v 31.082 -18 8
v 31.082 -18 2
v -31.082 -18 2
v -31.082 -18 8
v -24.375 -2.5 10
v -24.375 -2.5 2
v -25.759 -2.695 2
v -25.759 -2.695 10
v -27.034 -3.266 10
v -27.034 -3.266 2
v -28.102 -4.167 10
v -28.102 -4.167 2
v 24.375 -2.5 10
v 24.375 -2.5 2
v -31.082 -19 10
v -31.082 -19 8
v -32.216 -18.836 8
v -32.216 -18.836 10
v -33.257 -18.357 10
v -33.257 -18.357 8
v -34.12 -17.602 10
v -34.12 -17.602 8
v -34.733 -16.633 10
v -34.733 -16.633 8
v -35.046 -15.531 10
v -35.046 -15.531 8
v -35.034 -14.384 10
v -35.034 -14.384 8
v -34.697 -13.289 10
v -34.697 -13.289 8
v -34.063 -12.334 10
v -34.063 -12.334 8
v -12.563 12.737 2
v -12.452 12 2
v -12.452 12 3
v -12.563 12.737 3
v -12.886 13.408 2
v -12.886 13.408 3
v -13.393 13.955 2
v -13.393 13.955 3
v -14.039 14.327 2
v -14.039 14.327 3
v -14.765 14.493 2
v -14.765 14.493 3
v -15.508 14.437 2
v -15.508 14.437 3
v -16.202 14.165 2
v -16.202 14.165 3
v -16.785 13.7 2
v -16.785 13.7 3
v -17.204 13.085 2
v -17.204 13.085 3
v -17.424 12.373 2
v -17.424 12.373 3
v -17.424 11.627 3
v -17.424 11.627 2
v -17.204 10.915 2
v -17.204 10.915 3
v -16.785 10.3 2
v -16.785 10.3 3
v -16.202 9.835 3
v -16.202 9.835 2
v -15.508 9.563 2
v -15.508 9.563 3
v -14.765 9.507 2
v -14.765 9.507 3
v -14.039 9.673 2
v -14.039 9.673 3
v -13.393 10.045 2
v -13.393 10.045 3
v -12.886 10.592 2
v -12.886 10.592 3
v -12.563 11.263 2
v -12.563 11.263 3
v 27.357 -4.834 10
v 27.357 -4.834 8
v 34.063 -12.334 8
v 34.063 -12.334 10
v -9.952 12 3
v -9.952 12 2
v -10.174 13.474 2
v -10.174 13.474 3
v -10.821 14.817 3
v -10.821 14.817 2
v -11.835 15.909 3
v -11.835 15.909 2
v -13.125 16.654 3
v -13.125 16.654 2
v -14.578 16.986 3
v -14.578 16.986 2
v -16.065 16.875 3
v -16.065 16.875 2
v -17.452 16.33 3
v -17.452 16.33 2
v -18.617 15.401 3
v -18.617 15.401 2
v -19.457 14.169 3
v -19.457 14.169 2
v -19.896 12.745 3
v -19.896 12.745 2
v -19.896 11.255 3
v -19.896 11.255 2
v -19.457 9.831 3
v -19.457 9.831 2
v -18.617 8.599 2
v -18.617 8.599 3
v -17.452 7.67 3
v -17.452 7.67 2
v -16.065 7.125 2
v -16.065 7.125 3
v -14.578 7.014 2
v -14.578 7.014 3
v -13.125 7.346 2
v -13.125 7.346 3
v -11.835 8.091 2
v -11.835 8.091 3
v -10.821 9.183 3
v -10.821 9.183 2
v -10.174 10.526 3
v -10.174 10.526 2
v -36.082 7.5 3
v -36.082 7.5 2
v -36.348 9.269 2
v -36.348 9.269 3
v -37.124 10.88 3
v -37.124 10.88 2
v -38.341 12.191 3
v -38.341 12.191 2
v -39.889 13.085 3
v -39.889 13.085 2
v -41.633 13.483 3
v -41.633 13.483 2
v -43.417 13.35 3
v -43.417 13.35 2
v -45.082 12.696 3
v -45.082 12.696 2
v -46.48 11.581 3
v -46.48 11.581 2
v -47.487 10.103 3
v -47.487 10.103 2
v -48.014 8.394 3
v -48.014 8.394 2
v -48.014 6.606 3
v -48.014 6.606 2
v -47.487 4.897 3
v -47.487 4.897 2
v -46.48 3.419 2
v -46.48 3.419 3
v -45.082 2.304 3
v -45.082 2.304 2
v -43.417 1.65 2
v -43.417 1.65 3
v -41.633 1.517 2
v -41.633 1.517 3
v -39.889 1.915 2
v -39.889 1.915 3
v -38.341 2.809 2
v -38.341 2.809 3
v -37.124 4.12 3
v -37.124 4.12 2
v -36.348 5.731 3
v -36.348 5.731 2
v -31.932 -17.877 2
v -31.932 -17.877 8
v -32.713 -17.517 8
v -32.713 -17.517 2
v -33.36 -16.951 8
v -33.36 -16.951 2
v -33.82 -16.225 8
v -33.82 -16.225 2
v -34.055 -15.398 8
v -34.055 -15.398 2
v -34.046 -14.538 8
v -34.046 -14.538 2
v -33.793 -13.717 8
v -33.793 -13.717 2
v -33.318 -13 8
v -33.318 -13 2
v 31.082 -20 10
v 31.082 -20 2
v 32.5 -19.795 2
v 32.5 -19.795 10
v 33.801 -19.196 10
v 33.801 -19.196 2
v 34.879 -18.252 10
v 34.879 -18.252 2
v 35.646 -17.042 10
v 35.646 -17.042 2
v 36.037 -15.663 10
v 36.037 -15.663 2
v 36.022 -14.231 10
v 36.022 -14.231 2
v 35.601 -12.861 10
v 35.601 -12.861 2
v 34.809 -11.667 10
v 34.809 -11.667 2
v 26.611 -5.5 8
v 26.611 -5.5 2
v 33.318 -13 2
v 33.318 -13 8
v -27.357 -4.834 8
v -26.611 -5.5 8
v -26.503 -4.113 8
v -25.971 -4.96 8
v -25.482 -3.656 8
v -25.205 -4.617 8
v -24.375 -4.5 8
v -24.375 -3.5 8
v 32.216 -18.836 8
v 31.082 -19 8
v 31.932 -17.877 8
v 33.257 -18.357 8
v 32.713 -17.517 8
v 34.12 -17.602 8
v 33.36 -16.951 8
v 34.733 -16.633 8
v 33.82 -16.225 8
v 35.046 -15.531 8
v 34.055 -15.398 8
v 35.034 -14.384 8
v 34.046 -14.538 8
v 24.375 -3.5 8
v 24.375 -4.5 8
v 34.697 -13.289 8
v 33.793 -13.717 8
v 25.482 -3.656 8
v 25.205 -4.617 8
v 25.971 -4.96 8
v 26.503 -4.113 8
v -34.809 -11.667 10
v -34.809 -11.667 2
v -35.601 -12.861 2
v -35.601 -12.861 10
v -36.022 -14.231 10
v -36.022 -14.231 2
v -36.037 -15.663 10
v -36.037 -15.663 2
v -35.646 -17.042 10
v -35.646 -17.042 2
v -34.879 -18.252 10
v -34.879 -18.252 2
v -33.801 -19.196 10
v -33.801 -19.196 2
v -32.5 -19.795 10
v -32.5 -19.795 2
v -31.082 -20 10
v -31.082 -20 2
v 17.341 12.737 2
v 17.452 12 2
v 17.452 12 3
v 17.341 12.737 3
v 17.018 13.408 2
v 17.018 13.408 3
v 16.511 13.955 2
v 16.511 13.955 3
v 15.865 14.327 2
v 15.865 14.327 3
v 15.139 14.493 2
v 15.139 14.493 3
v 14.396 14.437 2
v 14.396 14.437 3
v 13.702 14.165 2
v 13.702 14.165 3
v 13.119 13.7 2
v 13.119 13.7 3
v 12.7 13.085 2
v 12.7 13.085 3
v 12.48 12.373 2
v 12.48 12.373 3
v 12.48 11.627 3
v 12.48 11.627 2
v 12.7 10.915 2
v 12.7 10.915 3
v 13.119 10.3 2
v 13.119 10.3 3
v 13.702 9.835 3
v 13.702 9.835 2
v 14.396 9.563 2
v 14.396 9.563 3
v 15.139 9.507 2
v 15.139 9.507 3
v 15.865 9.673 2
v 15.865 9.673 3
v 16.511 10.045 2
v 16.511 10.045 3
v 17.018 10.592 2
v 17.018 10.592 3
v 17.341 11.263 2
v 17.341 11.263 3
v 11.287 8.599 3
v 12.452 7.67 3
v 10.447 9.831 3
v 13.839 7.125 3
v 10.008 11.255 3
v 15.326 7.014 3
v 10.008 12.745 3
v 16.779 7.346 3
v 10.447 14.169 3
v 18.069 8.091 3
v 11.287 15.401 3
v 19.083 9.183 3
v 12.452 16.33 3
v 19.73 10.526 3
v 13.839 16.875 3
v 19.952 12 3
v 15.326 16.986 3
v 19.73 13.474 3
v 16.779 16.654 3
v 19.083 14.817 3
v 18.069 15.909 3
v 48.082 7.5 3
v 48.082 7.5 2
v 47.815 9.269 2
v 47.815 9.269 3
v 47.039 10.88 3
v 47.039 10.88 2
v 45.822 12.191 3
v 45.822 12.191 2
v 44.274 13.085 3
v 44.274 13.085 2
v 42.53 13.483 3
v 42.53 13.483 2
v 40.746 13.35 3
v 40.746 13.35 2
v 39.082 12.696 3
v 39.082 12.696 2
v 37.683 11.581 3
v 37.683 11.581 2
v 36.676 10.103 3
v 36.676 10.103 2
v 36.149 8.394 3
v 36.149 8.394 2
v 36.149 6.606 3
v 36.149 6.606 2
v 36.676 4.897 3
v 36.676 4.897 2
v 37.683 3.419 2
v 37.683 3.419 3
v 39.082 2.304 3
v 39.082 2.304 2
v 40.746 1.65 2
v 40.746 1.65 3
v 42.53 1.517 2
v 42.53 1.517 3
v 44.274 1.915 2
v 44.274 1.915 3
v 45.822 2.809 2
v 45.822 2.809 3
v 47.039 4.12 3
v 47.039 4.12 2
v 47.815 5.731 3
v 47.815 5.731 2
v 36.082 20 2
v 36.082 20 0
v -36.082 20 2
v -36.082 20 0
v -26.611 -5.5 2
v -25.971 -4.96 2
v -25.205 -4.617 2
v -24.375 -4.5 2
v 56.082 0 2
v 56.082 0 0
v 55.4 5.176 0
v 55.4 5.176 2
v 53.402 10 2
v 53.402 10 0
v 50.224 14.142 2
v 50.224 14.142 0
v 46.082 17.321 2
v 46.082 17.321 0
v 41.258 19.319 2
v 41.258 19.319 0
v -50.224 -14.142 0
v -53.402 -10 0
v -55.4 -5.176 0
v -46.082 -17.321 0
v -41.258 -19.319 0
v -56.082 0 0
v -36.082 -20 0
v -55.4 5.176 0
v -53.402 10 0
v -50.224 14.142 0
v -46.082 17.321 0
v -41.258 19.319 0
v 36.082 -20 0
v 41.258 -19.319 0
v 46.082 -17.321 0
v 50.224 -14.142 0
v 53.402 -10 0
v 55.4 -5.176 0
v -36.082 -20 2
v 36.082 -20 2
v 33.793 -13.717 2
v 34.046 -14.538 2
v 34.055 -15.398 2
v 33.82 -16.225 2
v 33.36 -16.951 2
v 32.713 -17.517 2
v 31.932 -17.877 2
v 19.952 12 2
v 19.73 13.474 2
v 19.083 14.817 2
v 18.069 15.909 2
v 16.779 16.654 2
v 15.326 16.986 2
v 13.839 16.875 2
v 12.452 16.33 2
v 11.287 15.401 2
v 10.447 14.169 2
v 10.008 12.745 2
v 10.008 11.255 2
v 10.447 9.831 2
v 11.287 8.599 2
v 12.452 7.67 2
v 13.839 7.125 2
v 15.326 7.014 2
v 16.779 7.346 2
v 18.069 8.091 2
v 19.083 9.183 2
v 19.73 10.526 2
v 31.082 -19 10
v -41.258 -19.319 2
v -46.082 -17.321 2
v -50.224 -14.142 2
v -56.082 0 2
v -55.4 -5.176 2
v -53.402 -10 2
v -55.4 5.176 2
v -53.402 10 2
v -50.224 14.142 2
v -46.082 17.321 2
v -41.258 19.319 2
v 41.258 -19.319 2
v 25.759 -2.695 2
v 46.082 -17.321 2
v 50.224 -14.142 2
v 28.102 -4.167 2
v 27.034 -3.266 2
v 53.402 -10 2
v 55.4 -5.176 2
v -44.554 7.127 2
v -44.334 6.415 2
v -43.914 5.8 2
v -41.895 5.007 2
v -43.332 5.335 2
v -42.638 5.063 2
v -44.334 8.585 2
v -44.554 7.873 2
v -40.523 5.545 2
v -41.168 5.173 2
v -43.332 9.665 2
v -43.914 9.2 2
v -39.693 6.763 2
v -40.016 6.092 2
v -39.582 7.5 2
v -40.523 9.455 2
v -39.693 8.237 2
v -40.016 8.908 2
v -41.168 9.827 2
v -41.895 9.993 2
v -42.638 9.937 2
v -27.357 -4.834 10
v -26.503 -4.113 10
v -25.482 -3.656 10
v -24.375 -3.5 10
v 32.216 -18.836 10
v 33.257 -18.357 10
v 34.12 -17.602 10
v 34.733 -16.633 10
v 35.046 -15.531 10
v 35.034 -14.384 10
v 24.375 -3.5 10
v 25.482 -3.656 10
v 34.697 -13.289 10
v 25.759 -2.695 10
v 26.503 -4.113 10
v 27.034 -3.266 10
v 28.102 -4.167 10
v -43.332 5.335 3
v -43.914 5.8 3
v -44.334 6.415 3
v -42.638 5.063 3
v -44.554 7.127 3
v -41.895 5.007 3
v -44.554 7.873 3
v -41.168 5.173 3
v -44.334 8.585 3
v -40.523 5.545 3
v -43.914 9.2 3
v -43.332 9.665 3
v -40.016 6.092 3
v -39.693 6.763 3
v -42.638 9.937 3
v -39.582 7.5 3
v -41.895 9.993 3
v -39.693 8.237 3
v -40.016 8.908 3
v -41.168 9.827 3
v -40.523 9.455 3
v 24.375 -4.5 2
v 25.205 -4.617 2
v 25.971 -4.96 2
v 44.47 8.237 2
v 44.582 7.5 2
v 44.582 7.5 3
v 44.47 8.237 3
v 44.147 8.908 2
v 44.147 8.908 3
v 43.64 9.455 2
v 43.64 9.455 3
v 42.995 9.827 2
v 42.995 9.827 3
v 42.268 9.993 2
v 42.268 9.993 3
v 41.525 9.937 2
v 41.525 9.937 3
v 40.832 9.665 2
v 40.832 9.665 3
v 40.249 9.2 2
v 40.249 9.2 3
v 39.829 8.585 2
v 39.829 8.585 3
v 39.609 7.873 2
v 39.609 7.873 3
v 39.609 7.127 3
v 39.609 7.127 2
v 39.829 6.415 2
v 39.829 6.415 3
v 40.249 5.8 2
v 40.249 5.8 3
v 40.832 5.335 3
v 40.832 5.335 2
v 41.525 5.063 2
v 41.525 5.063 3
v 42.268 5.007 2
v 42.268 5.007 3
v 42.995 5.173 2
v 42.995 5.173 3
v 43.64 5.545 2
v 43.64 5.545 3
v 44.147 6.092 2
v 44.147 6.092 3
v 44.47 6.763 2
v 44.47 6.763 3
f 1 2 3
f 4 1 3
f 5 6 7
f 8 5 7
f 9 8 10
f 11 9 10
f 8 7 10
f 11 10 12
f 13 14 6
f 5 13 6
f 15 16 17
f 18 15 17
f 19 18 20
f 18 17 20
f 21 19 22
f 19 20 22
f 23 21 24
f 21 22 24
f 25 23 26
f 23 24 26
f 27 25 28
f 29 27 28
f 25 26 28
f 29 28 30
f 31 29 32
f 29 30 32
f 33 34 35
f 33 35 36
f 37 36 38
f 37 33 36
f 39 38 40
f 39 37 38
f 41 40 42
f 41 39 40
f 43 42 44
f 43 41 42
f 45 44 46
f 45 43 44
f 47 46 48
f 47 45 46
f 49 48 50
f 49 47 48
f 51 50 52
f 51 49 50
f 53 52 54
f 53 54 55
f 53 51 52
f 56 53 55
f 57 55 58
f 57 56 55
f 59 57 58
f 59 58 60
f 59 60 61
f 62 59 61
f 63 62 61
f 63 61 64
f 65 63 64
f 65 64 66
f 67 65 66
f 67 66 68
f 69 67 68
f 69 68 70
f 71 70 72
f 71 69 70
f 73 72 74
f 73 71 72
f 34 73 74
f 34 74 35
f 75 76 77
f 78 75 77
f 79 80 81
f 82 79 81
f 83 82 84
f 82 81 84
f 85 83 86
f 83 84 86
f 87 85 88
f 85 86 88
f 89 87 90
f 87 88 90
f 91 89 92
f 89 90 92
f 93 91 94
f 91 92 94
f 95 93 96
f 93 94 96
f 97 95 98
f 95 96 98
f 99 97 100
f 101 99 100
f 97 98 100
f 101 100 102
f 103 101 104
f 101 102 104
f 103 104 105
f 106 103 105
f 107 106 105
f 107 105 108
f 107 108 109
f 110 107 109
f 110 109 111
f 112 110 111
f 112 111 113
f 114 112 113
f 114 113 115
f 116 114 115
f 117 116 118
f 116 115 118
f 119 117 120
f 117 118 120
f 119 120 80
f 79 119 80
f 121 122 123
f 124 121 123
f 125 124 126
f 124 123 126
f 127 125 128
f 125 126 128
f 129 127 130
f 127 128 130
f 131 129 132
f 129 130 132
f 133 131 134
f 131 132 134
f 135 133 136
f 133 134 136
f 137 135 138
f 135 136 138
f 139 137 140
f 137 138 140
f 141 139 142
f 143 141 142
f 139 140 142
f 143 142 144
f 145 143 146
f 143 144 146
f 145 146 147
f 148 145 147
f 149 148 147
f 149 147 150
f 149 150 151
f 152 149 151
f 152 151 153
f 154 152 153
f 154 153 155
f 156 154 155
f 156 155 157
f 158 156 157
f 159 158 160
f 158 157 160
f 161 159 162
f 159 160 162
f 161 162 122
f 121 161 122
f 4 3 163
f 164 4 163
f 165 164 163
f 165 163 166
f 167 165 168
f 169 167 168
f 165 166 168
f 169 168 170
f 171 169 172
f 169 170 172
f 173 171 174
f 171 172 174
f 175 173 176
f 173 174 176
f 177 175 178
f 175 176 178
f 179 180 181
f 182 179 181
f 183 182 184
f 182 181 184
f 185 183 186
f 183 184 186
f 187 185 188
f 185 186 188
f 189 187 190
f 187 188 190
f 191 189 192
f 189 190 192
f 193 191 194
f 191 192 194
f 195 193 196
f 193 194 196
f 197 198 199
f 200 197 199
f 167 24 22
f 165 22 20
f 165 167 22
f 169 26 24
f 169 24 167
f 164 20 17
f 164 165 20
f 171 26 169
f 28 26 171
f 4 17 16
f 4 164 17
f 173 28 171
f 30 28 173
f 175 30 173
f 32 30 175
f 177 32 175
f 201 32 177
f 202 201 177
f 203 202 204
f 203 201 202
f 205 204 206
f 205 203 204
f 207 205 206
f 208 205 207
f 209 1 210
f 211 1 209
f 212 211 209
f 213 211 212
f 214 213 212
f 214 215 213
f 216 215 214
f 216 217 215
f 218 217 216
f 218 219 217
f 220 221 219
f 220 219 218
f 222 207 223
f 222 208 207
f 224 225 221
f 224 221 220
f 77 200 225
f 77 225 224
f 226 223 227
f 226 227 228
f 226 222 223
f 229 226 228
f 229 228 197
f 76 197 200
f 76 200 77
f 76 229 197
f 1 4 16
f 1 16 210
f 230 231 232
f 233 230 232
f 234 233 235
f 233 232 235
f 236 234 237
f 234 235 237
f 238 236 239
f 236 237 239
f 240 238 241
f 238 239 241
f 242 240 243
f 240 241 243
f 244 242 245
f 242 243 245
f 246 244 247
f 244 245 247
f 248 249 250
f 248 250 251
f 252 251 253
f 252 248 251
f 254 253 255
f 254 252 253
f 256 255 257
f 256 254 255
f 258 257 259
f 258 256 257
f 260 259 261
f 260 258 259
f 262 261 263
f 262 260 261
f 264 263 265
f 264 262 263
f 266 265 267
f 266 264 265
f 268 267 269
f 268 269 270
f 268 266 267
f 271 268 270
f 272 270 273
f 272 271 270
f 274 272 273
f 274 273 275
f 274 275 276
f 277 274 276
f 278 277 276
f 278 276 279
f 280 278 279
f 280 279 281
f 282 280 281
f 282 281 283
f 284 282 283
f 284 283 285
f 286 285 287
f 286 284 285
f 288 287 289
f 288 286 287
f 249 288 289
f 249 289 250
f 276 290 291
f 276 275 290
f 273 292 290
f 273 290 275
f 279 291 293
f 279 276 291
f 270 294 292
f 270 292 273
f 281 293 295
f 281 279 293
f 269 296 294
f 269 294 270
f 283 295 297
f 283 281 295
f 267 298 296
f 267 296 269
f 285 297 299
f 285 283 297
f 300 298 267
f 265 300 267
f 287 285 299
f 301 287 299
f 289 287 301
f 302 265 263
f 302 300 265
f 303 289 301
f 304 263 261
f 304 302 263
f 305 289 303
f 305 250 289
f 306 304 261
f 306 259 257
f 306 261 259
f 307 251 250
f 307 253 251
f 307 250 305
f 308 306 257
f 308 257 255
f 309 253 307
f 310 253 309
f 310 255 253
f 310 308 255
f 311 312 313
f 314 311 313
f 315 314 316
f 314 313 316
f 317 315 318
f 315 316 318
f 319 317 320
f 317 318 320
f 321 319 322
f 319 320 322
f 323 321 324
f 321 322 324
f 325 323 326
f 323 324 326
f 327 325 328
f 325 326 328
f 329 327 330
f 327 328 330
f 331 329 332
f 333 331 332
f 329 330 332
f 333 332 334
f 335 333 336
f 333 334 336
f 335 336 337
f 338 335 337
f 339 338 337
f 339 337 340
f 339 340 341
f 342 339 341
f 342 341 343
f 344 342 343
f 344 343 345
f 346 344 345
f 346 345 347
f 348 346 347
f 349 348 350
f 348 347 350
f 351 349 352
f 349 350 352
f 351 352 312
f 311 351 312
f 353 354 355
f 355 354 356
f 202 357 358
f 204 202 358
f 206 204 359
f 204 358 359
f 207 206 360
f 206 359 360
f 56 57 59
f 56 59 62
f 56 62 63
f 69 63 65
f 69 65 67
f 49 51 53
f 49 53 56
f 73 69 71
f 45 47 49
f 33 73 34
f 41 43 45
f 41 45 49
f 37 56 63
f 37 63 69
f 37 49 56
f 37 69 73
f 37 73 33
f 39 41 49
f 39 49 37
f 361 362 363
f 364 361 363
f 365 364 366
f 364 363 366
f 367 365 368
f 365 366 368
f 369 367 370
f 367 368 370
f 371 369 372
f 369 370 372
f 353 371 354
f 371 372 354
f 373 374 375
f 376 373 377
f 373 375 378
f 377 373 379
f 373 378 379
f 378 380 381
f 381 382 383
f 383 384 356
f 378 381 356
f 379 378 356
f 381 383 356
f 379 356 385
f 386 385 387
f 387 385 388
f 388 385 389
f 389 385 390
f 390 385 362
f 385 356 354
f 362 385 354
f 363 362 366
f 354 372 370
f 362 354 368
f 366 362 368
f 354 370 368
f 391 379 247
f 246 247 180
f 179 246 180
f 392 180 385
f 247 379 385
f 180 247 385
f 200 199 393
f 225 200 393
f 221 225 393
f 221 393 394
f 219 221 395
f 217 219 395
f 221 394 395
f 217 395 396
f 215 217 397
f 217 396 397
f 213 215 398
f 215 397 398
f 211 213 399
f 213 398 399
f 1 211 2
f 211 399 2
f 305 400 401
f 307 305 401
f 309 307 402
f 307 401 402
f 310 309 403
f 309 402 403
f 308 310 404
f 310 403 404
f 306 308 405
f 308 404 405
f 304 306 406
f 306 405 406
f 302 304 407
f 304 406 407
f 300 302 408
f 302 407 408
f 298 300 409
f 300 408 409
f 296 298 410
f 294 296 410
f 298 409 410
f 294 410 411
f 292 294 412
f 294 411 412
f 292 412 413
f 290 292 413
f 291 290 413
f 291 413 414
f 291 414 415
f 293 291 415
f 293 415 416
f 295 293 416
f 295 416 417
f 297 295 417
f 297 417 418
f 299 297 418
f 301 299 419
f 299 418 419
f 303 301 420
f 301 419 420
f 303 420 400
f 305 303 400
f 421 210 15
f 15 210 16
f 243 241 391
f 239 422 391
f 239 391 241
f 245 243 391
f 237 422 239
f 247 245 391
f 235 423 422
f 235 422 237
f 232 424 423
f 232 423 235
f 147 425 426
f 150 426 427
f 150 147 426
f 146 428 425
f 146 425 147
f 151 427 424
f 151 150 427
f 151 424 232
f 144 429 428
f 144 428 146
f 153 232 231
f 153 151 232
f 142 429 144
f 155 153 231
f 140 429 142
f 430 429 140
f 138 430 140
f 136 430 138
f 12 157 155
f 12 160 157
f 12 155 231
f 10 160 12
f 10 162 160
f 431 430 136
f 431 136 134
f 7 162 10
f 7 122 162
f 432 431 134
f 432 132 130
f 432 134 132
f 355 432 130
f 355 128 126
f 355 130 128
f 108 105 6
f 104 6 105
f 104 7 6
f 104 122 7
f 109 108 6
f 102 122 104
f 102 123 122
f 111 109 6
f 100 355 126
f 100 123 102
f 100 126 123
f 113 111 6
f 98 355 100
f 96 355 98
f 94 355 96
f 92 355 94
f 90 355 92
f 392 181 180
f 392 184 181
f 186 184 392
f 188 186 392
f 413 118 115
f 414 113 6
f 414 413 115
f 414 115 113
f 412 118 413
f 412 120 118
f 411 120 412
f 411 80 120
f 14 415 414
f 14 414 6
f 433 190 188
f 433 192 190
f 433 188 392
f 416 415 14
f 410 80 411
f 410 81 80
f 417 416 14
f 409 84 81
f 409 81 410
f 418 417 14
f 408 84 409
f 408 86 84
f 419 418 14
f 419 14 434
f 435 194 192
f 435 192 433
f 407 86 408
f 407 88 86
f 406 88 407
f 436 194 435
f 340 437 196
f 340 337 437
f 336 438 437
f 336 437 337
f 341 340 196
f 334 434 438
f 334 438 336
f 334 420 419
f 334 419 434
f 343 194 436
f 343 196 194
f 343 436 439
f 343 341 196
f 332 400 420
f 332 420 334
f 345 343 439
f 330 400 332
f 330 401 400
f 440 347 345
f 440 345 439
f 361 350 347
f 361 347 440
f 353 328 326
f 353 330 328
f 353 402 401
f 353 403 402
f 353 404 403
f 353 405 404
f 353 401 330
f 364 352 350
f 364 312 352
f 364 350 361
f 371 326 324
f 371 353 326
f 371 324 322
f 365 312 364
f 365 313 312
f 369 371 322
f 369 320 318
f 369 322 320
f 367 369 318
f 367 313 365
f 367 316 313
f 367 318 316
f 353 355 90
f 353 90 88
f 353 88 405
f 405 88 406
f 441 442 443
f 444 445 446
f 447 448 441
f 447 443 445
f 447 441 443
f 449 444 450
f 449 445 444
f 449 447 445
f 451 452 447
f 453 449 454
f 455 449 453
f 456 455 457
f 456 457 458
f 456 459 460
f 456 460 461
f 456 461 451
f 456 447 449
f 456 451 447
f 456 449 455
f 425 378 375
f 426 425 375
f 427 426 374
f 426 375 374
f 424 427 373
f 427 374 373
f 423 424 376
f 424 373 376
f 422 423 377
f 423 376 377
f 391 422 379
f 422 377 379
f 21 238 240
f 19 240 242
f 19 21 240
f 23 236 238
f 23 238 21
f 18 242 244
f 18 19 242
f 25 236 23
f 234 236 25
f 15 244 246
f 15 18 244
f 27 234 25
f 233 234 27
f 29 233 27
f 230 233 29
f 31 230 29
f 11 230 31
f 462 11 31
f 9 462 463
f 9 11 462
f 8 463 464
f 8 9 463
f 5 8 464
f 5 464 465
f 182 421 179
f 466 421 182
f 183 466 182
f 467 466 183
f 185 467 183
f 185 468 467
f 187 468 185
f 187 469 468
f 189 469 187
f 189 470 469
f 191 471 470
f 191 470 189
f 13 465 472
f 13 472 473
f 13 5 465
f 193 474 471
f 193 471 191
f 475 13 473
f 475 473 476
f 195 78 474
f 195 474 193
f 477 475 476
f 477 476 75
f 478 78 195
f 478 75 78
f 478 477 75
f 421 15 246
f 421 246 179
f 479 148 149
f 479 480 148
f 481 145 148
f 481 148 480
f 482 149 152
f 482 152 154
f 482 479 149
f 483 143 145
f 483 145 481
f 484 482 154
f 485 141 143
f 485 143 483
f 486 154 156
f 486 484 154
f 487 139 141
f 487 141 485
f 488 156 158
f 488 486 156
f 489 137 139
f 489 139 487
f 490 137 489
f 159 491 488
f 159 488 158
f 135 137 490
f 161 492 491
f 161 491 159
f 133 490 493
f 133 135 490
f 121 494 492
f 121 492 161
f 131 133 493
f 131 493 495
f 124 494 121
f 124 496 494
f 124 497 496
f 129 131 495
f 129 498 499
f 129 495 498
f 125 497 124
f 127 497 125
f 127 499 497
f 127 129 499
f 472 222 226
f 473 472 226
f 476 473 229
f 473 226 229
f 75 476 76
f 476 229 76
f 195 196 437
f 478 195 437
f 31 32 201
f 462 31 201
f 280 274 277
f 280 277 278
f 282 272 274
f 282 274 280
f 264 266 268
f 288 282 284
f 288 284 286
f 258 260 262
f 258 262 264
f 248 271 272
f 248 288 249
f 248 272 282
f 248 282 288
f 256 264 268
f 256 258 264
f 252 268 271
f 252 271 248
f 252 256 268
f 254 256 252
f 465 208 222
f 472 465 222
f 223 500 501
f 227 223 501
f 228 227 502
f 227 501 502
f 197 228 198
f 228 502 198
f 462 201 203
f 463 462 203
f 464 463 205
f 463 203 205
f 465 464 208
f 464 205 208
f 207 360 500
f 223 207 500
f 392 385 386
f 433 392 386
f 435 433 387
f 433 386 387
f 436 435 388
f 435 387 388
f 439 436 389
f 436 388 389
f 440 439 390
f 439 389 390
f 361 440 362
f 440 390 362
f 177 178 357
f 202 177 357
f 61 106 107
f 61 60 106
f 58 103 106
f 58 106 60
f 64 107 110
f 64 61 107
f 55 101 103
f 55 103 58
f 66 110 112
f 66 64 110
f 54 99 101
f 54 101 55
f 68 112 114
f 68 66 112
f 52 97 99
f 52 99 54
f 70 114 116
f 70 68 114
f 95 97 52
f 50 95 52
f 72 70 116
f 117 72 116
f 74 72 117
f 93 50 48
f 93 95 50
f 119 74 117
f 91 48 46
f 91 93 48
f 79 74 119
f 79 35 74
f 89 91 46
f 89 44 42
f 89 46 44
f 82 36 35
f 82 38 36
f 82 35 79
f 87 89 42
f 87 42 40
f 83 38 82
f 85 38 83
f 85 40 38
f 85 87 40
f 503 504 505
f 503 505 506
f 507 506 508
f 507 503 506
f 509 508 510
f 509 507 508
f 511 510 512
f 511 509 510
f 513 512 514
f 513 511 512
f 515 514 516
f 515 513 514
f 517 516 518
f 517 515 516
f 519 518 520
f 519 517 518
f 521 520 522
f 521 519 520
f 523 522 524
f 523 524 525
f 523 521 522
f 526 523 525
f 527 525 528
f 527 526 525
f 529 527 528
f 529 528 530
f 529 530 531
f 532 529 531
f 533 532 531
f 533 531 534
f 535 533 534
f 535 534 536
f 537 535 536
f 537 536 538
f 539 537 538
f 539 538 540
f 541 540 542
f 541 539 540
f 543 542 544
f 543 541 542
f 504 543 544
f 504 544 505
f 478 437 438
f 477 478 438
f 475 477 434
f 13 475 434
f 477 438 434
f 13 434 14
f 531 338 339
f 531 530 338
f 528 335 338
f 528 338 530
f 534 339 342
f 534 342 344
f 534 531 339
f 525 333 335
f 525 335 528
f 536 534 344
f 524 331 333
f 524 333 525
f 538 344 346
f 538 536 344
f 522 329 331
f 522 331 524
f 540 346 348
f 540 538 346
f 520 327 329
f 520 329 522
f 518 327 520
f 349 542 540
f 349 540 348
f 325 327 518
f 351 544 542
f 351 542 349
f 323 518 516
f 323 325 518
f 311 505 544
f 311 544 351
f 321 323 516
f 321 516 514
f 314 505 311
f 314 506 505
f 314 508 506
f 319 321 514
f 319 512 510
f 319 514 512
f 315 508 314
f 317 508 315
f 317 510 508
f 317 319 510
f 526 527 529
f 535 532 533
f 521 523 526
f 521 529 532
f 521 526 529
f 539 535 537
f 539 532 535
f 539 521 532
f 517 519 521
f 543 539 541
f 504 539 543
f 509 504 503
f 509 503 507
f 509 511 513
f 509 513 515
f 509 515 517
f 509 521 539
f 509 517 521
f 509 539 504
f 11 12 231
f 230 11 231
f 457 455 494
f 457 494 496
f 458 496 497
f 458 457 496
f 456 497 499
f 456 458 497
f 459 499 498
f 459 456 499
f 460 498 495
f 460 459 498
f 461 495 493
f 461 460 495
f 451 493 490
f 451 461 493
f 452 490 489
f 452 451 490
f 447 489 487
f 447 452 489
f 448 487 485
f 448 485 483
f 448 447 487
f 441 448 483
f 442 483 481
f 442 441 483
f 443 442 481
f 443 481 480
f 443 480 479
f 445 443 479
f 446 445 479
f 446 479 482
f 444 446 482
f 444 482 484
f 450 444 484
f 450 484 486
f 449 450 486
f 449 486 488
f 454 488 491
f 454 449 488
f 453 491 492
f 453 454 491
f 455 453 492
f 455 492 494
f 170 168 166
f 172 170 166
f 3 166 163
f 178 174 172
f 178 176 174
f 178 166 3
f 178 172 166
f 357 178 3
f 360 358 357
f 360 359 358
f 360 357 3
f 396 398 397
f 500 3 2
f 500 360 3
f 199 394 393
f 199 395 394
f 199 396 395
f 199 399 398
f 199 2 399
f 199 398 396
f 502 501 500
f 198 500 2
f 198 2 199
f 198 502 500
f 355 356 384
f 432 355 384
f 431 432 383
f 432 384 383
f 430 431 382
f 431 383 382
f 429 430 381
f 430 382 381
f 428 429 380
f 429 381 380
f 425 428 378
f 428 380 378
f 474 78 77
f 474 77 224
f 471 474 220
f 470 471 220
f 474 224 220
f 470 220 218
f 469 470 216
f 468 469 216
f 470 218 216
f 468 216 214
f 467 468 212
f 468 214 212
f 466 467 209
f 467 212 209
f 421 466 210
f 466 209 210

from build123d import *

# Parameters (mm, degrees)
F1_DEPTH = 2
F2_R     = 6
F2_R_2   = 2.5
F2_R_3   = 5
F3_DEPTH = 1
F5_DEPTH = 8
F7_DEPTH = 6


with BuildPart() as f1:
    # F0 (on Top) → F1 (new body)
    with BuildSketch(Plane.XY):
        with BuildLine():
            Line((-36.0815, -20), (36.0815, -20))
            ThreePointArc((36.0815, -20), (50.223636, -14.142136), (56.0815, 0))
            ThreePointArc((56.0815, 0), (50.223636, 14.142136), (36.0815, 20))
            Line((36.0815, 20), (-36.0815, 20))
            ThreePointArc((-36.0815, 20), (-50.223636, 14.142136), (-56.0815, 0))
            ThreePointArc((-56.0815, 0), (-50.223636, -14.142136), (-36.0815, -20))
        make_face()
    extrude(amount=F1_DEPTH)

    # F2 (on face) → F3 (join)
    with BuildSketch(Plane.XY.offset(2)):
        with Locations((-42.0815, 7.5)):
            Circle(F2_R)
        with Locations((-42.0815, 7.5)):
            Circle(F2_R_2, mode=Mode.SUBTRACT)
        with Locations((-14.952, 12)):
            Circle(F2_R_3)
        with Locations((-14.952, 12)):
            Circle(F2_R_2, mode=Mode.SUBTRACT)
        with Locations((42.0815, 7.5)):
            Circle(F2_R)
        with Locations((42.0815, 7.5)):
            Circle(F2_R_2, mode=Mode.SUBTRACT)
        with Locations((14.952, 12)):
            Circle(F2_R_3)
        with Locations((14.952, 12)):
            Circle(F2_R_2, mode=Mode.SUBTRACT)
    extrude(amount=F3_DEPTH)

    # F4 (on face) → F5 (join)
    with BuildSketch(Plane.XY.offset(2)):
        with BuildLine():
            Line((-31.0815, -20), (0, -20))
            Line((0, -20), (31.0815, -20))
            ThreePointArc((31.0815, -20), (35.645717, -17.041549), (34.808729, -11.667169))
            Line((34.808729, -11.667169), (28.102344, -4.167169))
            ThreePointArc((28.102344, -4.167169), (26.416664, -2.935783), (24.375115, -2.5))
            Line((24.375115, -2.5), (0, -2.5))
            Line((0, -2.5), (-24.375115, -2.5))
            ThreePointArc((-24.375115, -2.5), (-26.416664, -2.935783), (-28.102344, -4.167169))
            Line((-28.102344, -4.167169), (-34.808729, -11.667169))
            ThreePointArc((-34.808729, -11.667169), (-35.645717, -17.041549), (-31.0815, -20))
        make_face()
        with BuildLine():
            Line((31.0815, -19), (0, -19))
            Line((0, -19), (-31.0815, -19))
            ThreePointArc((-31.0815, -19), (-34.732874, -16.633239), (-34.063283, -12.333735))
            Line((-34.063283, -12.333735), (-27.356898, -4.833735))
            ThreePointArc((-27.356898, -4.833735), (-26.008354, -3.848626), (-24.375115, -3.5))
            Line((-24.375115, -3.5), (0, -3.5))
            Line((0, -3.5), (24.375115, -3.5))
            ThreePointArc((24.375115, -3.5), (26.008354, -3.848626), (27.356898, -4.833735))
            Line((27.356898, -4.833735), (34.063283, -12.333735))
            ThreePointArc((34.063283, -12.333735), (34.732874, -16.633239), (31.0815, -19))
        make_face(mode=Mode.SUBTRACT)
    extrude(amount=F5_DEPTH)

    # F6 (on face) → F7 (join)
    with BuildSketch(Plane.XY.offset(2)):
        with BuildLine():
            Line((24.375115, -3.5), (-24.375115, -3.5))
            ThreePointArc((-24.375115, -3.5), (-26.008354, -3.848626), (-27.356898, -4.833735))
            Line((-27.356898, -4.833735), (-34.063283, -12.333735))
            ThreePointArc((-34.063283, -12.333735), (-34.732874, -16.633239), (-31.0815, -19))
            Line((-31.0815, -19), (31.0815, -19))
            ThreePointArc((31.0815, -19), (34.732874, -16.633239), (34.063283, -12.333735))
            Line((34.063283, -12.333735), (27.356898, -4.833735))
            ThreePointArc((27.356898, -4.833735), (26.008354, -3.848626), (24.375115, -3.5))
        make_face()
        with BuildLine():
            ThreePointArc((24.375115, -4.5), (25.600044, -4.76147), (26.611452, -5.500301))
            Line((26.611452, -5.500301), (33.317837, -13.000301))
            ThreePointArc((33.317837, -13.000301), (33.82003, -16.224929), (31.0815, -18))
            Line((31.0815, -18), (-31.0815, -18))
            ThreePointArc((-31.0815, -18), (-33.82003, -16.224929), (-33.317837, -13.000301))
            Line((-33.317837, -13.000301), (-26.611452, -5.500301))
            ThreePointArc((-26.611452, -5.500301), (-25.600044, -4.76147), (-24.375115, -4.5))
            Line((-24.375115, -4.5), (24.375115, -4.5))
        make_face(mode=Mode.SUBTRACT)
    extrude(amount=F7_DEPTH)


solid = f1.part
